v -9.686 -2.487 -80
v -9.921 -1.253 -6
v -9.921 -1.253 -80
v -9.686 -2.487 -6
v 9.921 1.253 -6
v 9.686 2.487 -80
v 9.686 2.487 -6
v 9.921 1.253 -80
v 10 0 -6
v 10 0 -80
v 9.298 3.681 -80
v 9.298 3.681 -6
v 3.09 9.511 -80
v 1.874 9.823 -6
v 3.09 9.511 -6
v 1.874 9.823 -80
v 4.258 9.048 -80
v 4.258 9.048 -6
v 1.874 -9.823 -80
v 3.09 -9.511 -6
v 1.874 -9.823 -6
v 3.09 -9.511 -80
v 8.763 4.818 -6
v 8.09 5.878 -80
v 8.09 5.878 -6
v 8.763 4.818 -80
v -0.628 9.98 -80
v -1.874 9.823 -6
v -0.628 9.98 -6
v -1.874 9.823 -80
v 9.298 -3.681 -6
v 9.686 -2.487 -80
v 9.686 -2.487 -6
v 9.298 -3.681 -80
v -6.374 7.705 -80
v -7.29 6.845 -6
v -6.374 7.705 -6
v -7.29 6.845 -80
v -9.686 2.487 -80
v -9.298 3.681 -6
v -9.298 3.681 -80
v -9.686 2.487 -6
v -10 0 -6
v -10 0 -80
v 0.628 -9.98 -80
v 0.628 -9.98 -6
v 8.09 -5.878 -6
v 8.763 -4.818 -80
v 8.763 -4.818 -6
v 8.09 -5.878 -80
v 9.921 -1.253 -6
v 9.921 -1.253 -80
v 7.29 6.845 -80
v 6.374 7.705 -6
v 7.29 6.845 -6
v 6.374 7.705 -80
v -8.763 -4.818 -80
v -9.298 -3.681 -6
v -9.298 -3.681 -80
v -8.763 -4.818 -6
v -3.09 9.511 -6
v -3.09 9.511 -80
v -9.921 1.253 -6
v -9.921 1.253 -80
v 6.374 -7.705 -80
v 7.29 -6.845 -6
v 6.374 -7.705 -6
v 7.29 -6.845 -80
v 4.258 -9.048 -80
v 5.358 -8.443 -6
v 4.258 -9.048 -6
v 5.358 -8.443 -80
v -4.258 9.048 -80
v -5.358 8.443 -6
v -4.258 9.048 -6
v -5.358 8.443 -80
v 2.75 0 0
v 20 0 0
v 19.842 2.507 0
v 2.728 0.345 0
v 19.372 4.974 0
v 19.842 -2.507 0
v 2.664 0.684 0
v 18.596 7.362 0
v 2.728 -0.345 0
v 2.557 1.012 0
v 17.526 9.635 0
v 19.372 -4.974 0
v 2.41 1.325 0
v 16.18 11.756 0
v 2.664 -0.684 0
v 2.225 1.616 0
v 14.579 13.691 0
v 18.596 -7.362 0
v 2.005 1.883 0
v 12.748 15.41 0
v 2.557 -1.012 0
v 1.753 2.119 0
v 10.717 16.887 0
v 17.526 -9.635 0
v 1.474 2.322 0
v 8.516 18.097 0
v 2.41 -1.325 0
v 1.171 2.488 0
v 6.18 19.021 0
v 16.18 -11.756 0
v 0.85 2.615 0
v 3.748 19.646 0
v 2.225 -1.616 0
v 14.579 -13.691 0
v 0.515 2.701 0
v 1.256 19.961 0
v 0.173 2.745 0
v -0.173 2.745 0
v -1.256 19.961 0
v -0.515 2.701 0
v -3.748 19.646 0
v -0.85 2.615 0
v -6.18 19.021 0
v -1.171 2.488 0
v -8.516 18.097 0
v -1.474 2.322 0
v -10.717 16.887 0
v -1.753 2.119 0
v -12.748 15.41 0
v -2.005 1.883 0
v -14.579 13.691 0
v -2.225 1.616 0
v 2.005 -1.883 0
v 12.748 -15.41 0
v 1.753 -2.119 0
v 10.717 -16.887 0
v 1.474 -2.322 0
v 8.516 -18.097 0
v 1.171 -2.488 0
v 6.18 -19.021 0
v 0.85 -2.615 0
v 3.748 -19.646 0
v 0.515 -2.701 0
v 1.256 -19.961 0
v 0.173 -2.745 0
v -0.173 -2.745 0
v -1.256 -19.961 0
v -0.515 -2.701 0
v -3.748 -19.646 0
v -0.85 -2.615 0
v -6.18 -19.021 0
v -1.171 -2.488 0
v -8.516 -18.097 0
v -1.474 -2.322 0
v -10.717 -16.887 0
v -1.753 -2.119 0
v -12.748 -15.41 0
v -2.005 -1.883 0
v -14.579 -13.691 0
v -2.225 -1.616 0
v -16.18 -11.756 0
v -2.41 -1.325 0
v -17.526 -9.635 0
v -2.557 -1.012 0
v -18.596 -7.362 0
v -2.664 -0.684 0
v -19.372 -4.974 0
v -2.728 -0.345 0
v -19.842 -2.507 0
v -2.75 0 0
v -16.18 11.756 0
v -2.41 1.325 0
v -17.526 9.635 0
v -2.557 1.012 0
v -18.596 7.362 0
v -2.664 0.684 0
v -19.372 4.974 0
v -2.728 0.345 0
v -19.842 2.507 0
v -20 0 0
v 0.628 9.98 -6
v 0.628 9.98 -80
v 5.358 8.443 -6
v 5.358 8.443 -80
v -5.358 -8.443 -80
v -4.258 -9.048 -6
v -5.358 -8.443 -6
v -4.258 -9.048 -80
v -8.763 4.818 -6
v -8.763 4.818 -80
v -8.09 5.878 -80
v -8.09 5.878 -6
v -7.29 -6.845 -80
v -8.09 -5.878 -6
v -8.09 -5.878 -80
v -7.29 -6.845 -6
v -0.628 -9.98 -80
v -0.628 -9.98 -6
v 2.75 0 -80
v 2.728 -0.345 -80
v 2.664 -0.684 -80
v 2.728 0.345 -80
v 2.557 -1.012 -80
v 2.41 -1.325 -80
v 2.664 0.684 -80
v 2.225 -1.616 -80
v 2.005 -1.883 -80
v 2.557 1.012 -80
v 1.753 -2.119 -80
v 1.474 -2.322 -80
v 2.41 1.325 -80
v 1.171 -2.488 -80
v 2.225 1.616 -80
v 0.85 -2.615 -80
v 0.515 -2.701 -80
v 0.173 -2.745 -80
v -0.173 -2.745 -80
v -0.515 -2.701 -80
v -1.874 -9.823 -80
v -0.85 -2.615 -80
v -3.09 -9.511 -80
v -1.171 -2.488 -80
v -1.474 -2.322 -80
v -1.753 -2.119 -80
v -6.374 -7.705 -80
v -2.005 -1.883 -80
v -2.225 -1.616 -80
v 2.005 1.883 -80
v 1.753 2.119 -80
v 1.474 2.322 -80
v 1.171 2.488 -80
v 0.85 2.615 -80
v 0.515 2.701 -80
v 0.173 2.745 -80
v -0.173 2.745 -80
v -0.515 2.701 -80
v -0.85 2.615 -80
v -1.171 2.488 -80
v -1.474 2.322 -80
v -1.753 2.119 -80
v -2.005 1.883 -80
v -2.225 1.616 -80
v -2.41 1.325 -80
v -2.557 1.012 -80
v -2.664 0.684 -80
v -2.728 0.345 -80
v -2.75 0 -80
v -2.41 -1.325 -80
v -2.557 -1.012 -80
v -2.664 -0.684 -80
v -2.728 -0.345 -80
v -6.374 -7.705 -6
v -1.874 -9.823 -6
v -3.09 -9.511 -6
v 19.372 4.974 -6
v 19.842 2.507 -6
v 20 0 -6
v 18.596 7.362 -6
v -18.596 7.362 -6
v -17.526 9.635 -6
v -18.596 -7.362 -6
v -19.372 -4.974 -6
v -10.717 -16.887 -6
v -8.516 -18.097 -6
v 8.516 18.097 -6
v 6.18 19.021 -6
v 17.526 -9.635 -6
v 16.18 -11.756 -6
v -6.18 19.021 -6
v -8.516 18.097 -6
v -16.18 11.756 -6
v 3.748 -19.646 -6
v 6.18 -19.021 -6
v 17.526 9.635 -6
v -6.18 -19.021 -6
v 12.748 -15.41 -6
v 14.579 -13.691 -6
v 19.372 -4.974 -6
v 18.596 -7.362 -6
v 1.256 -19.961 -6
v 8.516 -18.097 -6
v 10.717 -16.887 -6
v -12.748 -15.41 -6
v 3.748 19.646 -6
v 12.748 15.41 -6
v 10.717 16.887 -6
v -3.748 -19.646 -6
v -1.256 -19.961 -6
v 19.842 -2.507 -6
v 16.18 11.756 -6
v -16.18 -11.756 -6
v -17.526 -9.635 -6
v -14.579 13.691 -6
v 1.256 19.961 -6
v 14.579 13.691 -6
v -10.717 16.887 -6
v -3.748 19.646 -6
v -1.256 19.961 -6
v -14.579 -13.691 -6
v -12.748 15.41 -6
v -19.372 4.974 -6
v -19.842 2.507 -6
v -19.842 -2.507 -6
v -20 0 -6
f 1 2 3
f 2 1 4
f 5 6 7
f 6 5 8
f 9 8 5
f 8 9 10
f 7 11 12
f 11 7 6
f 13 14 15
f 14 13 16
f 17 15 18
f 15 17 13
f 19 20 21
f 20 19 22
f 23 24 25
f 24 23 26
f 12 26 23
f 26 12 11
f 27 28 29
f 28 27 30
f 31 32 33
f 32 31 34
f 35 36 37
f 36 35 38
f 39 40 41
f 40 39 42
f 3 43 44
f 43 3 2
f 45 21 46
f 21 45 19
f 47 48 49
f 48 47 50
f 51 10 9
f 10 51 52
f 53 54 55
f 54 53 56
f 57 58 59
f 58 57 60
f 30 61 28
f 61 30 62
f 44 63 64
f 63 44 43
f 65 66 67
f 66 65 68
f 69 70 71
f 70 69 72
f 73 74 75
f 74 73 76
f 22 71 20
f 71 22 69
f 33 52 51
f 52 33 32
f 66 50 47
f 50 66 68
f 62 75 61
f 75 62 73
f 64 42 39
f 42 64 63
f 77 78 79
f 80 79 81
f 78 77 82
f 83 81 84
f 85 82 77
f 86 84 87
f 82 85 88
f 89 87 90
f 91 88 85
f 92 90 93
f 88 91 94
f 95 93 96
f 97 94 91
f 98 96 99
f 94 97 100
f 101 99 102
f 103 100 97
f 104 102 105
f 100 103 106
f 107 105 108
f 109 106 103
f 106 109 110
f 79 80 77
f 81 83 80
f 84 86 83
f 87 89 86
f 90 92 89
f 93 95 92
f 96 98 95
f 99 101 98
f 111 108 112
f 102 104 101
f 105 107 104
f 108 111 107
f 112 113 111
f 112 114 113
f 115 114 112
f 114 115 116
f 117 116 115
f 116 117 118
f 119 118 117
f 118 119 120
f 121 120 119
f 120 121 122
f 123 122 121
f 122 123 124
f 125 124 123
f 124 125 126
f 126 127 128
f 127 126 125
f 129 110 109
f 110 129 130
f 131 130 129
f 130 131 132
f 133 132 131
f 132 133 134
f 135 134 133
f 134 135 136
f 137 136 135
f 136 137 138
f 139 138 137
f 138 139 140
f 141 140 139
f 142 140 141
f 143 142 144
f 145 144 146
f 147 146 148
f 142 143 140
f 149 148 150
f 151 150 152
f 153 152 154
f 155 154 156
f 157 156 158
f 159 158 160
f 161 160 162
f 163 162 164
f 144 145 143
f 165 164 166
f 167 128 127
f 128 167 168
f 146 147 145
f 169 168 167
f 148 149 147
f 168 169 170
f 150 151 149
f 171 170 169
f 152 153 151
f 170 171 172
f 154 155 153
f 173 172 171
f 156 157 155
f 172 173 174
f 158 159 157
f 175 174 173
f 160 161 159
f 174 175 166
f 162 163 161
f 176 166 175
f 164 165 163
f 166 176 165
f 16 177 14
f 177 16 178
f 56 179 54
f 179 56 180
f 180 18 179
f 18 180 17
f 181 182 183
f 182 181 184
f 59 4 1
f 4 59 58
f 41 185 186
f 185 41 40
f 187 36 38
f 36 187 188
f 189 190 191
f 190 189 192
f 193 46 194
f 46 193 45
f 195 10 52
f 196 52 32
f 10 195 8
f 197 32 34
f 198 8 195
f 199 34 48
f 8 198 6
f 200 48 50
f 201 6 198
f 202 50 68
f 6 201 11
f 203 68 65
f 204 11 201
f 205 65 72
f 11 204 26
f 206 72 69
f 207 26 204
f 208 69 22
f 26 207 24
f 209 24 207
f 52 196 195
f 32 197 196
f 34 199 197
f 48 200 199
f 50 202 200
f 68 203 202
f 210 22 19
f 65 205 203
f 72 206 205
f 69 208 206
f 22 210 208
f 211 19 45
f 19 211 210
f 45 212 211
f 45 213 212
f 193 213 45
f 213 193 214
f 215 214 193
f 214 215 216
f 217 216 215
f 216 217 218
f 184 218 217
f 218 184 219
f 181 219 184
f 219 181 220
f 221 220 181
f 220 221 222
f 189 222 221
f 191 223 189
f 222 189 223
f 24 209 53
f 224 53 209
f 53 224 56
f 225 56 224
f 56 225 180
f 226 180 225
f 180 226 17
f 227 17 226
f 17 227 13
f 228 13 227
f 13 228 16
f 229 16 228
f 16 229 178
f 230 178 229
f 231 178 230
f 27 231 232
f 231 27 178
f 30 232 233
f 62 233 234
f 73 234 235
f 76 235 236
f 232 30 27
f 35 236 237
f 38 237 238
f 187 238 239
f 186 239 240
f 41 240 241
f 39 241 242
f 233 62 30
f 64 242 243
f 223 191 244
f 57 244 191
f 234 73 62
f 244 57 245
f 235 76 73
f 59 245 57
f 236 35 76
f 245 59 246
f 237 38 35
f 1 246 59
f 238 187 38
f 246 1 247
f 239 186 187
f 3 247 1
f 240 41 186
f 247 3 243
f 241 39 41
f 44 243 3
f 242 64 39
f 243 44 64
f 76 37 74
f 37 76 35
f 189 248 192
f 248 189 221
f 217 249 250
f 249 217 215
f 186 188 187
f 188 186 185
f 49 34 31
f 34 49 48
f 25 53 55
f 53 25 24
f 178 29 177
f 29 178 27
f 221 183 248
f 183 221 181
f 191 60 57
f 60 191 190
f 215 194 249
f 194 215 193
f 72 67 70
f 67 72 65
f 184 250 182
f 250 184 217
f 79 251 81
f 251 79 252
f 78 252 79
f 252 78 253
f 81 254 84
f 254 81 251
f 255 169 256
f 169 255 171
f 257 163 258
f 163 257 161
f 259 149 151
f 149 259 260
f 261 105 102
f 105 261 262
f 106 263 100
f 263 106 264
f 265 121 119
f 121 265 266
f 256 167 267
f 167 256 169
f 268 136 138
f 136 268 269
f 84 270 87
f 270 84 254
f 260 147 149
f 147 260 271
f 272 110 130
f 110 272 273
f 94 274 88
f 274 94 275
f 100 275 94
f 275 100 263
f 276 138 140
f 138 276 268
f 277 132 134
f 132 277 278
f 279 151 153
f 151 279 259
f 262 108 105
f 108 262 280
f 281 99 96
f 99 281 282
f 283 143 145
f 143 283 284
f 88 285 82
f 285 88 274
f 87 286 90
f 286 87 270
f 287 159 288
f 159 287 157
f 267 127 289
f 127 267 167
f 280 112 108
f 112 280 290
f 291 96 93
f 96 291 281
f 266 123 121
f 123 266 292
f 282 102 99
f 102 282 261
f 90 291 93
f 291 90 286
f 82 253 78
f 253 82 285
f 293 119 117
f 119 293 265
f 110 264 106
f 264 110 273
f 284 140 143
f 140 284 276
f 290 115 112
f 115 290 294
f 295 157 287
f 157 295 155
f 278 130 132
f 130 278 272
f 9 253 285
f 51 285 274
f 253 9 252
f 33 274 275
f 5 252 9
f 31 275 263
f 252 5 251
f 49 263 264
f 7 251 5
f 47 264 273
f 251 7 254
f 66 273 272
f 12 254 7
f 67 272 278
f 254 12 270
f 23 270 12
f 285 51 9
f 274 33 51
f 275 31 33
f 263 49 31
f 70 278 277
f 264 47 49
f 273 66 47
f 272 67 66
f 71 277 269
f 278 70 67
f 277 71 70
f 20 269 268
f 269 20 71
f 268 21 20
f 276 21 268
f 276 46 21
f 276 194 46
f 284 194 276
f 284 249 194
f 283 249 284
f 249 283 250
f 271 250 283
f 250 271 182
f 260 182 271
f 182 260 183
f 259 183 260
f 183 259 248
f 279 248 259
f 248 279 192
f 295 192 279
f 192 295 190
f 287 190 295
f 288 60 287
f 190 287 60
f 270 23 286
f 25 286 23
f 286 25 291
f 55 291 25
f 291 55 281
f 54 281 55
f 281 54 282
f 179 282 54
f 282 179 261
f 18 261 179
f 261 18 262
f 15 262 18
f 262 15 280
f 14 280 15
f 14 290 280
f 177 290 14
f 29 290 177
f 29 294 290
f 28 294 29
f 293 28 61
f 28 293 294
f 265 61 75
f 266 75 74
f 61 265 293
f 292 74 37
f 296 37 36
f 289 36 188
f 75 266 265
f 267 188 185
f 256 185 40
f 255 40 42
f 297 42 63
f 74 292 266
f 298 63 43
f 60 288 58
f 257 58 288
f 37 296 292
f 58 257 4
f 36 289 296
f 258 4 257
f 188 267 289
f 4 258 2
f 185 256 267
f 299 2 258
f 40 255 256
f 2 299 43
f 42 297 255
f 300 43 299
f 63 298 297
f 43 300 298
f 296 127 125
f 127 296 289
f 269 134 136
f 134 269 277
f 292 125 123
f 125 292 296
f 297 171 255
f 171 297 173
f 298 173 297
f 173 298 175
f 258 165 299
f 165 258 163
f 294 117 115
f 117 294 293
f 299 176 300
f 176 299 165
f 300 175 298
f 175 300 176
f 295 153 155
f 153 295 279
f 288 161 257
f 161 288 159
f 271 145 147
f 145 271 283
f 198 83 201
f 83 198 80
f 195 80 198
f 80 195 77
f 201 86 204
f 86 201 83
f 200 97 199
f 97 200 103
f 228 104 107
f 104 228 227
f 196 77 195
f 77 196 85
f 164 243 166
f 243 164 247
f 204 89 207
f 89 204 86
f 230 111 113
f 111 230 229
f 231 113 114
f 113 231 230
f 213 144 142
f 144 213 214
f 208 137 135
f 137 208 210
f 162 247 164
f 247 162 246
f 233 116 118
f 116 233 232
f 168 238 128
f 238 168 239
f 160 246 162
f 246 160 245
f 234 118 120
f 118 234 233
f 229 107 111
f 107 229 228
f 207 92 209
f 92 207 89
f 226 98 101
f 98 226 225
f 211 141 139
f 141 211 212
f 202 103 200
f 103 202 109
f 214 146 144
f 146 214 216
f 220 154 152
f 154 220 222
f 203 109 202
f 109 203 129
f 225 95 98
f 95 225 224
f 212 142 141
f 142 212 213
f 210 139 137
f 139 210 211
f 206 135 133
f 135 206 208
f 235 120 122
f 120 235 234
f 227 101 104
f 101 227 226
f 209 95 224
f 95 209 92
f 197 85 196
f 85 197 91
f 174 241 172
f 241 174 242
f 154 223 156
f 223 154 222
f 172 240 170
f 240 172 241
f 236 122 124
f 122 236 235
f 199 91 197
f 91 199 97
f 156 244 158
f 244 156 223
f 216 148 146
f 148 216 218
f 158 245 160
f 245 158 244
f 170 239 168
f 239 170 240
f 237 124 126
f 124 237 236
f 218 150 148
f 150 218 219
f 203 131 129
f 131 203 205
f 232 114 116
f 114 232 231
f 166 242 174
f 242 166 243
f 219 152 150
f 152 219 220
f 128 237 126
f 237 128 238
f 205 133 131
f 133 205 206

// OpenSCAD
$fn = 50;


difference() {
	union() {
		translate(v = [0, 0, -80.0000000000]) {
			cylinder(h = 80, r = 10.0000000000);
		}
		translate(v = [0, 0, -6.0000000000]) {
			cylinder(h = 6, r = 20.0000000000);
		}
	}
	union() {
		#translate(v = [0, 0, -80]) {
			cylinder(h = 80, r = 2.7500000000);
		}
	}
}
